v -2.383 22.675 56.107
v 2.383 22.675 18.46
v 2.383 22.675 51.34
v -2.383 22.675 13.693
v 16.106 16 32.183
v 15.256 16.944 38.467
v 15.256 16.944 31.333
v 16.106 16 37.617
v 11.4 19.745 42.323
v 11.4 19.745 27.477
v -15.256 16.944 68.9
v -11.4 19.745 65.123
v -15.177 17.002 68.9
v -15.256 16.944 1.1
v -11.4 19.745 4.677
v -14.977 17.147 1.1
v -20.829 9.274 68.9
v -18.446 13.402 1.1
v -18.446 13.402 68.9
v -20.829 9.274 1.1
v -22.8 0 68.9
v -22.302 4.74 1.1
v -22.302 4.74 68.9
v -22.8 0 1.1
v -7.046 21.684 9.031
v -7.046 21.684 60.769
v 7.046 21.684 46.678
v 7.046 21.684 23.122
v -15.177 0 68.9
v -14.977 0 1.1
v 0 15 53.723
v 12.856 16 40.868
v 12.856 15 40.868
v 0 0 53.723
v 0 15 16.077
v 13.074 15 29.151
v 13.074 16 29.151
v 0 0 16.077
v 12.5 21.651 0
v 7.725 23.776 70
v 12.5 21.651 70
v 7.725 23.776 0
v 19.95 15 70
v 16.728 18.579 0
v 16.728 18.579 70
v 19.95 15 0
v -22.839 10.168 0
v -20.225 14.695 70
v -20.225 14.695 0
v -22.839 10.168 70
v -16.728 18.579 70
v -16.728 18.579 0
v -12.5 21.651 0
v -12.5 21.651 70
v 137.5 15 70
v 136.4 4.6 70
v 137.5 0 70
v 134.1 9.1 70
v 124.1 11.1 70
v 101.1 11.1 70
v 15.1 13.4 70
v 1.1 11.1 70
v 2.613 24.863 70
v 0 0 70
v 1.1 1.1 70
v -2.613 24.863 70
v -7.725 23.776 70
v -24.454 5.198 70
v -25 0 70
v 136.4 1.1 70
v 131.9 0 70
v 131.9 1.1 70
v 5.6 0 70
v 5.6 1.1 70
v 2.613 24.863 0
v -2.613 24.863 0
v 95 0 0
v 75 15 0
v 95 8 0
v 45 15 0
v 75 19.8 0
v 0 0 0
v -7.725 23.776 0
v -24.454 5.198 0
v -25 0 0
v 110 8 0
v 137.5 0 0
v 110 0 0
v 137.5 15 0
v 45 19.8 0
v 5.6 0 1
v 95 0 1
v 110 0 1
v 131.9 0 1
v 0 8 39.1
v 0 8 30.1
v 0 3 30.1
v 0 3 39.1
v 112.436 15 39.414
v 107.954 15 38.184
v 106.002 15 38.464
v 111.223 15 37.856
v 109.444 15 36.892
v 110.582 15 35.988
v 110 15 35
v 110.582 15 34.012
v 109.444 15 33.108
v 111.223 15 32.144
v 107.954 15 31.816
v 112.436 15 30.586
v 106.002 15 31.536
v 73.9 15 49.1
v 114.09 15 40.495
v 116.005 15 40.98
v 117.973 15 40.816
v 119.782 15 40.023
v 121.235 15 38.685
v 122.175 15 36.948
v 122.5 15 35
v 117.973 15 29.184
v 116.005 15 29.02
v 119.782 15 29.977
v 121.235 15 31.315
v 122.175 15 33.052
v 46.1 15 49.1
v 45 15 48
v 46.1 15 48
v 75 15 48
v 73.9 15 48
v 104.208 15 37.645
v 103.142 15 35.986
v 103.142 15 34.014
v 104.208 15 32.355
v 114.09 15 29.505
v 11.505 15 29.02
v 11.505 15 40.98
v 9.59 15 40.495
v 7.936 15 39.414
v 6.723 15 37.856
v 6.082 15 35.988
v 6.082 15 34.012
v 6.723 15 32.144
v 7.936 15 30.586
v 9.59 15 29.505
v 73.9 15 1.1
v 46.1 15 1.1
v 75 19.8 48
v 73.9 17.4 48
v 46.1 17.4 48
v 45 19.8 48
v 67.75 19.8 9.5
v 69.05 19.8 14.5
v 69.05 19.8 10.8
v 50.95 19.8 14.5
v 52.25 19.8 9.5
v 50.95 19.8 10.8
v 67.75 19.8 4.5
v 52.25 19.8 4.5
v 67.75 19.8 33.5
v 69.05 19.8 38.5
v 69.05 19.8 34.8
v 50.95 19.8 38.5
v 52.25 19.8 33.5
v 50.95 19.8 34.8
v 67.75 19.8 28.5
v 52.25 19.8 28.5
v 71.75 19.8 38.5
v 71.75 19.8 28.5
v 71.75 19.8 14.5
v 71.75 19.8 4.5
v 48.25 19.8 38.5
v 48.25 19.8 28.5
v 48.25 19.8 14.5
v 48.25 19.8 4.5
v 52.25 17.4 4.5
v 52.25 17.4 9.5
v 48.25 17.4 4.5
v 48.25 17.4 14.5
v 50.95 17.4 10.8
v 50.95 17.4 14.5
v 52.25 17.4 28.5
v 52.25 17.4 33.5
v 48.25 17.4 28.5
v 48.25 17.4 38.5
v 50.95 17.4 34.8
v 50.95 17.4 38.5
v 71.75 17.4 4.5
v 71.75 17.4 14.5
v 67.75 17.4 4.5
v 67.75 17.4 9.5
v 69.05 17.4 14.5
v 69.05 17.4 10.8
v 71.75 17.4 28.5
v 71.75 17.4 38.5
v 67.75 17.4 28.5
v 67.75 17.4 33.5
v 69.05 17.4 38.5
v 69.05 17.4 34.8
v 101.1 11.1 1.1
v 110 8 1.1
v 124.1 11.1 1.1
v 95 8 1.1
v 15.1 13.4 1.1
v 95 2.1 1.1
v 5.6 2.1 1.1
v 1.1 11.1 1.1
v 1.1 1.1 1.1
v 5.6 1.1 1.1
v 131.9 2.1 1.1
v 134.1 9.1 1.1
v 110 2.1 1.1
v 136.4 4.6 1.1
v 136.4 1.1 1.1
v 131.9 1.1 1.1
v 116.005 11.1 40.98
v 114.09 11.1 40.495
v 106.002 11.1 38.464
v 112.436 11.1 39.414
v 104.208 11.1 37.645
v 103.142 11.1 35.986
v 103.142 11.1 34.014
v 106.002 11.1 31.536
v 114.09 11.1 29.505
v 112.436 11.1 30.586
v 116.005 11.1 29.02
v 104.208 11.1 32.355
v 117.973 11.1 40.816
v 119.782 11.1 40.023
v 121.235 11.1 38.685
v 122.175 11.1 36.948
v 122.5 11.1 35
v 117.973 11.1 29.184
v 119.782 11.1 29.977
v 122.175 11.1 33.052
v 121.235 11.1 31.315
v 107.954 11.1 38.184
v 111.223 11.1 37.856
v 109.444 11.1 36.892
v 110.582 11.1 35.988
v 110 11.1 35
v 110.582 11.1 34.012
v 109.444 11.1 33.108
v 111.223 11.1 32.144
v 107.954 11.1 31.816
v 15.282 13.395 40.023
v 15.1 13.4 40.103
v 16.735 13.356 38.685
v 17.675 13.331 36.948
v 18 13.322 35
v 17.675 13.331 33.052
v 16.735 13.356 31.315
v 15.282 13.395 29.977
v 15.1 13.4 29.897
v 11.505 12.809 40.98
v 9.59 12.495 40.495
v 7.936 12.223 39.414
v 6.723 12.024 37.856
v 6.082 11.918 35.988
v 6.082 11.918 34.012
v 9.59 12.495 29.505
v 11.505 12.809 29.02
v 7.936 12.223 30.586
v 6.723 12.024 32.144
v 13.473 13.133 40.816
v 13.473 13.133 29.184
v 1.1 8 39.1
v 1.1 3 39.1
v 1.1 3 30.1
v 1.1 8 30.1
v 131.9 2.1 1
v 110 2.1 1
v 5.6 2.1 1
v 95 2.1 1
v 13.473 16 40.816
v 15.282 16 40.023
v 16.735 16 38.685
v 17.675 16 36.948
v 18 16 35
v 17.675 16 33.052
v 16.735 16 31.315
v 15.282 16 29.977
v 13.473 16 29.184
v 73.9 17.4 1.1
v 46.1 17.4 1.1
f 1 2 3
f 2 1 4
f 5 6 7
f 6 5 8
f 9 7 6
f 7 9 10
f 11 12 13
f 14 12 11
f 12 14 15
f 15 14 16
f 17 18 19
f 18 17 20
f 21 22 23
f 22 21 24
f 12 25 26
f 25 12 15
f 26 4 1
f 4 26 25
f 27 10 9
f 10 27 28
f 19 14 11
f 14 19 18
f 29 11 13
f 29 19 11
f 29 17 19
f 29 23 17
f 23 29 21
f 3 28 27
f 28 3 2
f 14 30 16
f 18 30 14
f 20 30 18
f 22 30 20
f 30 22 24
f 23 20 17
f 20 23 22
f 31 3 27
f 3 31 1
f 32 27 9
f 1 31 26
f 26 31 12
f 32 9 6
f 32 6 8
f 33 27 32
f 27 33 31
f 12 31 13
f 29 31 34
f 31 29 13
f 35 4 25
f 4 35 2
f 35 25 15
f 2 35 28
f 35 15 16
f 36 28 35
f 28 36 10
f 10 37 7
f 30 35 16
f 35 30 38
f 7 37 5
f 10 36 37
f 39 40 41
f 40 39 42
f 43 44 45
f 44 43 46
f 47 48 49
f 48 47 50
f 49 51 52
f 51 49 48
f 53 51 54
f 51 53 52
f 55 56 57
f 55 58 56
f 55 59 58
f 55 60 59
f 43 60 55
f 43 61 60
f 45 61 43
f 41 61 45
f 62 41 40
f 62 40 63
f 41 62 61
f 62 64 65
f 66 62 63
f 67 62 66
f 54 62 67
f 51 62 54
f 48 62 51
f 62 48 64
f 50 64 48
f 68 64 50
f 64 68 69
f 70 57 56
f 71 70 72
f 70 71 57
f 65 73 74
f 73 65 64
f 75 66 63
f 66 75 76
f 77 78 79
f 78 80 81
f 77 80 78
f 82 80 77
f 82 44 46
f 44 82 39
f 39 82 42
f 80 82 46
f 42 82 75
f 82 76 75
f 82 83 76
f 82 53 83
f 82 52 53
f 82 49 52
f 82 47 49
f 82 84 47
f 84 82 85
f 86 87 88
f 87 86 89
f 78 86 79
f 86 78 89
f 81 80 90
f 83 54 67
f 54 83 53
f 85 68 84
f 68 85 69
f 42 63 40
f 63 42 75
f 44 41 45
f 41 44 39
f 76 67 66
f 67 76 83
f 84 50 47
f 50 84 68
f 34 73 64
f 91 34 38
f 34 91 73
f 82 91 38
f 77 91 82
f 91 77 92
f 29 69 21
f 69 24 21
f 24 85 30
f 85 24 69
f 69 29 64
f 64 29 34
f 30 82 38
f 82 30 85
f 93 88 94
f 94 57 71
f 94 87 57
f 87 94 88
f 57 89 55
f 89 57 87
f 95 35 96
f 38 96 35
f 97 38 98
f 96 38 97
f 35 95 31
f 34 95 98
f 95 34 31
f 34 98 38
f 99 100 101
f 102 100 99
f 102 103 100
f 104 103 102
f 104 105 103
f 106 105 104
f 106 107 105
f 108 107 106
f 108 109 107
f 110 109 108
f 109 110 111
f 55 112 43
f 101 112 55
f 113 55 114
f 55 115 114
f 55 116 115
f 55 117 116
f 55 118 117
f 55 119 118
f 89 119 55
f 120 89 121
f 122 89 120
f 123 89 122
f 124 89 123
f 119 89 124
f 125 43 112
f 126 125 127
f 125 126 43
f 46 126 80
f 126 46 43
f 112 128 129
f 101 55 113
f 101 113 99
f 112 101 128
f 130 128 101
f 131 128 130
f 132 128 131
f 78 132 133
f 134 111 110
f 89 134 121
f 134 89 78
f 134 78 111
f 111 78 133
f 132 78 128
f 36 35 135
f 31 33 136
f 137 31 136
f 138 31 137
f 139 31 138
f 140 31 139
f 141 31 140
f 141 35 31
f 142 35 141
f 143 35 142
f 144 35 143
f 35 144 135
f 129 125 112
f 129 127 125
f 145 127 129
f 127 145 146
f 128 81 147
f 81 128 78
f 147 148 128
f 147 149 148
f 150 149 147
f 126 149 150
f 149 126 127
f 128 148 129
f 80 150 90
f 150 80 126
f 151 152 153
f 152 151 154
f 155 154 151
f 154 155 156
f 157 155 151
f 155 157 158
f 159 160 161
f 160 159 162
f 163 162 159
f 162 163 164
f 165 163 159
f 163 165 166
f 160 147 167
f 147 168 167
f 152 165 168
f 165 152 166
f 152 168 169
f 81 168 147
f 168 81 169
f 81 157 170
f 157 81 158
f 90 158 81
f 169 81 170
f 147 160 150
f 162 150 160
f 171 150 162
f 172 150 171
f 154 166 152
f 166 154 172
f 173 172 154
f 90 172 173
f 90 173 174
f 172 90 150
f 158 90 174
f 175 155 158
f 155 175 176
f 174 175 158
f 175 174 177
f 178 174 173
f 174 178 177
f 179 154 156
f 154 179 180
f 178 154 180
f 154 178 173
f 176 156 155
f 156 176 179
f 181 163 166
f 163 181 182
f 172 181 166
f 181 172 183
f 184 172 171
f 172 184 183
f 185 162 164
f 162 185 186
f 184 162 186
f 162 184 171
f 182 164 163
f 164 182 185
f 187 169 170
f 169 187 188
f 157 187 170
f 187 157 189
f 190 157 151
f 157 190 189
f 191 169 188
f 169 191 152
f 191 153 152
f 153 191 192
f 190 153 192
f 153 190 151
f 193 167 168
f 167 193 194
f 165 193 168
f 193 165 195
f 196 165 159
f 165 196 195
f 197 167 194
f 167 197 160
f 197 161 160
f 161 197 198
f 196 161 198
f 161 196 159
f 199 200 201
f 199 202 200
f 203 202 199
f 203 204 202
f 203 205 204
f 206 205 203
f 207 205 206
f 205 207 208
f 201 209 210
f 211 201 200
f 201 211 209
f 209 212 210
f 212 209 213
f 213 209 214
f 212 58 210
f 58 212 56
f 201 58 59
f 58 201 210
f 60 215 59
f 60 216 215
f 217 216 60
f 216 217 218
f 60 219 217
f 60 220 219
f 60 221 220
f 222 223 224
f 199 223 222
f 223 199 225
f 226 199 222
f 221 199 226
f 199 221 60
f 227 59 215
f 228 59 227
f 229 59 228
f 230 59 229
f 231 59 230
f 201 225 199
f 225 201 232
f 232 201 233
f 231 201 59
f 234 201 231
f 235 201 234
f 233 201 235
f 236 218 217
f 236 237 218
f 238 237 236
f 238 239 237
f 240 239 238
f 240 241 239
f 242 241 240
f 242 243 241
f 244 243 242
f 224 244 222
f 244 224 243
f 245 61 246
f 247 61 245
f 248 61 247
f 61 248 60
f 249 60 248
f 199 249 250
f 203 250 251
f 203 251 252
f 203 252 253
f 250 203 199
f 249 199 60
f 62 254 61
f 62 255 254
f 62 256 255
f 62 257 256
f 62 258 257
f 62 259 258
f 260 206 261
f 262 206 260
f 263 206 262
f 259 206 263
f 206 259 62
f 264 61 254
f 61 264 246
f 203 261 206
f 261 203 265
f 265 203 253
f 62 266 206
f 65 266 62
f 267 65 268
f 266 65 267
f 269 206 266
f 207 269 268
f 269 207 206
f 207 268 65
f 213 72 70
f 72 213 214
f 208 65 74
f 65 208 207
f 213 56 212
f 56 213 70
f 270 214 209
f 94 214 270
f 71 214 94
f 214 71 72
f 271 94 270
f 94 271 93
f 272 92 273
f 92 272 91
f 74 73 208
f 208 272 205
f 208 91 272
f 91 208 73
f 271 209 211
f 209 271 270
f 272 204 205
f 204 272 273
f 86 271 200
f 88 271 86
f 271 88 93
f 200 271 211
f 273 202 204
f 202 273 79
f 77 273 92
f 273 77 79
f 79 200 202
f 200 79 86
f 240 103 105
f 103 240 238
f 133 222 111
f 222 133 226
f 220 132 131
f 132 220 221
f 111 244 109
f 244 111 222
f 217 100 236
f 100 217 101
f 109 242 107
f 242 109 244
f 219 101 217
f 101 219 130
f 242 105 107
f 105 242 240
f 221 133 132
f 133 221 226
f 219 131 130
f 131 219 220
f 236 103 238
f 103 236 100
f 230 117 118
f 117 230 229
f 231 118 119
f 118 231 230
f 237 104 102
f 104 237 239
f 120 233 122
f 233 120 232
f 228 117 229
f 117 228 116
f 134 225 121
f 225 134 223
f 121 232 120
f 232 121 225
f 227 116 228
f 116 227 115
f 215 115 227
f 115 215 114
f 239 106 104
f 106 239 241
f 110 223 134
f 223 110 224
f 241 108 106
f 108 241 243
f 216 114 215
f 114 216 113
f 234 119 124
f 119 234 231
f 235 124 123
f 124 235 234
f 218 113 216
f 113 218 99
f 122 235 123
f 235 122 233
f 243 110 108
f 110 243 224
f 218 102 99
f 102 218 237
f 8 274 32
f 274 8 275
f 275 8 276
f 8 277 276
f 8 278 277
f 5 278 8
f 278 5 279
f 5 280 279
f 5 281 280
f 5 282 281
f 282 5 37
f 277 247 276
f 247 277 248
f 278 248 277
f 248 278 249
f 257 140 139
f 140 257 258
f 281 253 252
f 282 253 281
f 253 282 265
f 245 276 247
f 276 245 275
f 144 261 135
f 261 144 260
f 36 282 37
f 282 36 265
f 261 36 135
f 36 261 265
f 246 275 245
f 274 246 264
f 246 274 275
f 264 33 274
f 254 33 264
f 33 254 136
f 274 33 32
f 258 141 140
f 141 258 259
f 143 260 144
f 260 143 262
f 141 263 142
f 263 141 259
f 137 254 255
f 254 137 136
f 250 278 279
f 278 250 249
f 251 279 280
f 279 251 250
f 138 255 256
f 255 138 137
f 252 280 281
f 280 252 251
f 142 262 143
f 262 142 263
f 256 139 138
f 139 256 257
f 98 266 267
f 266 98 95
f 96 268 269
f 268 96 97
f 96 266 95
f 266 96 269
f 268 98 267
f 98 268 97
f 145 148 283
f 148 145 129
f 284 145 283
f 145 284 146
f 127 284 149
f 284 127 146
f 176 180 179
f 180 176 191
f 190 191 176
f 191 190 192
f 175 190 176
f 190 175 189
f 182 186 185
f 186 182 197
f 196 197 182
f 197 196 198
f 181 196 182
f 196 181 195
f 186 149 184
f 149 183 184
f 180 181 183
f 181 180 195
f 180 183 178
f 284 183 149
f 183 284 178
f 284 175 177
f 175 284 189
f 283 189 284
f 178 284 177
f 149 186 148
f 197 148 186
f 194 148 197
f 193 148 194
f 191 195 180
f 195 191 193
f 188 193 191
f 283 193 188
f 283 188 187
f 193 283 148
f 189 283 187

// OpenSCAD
/*
 * Galaxy Nexus Mount
 *
 * Copyright 2012 <b@Zi.iS>
 * License CC BY 3.0.
 *
 */

thickness = 1.1;
depth = 15;

mount_width=30;
mount_height=43;
mount_offset=45;
mount_lip = 2.4;
mount_depth = 2.4;
mount_thickness=2.7;
mount_overhang = 4;
mount_size = 5;
mount_pitch_x = 19.5;
mount_pitch_y = 24;
mount_print = sqrt(pow((mount_overhang-mount_thickness),2)*2);

horn=25;

difference() {

	union() {

		//Case
		cube([
			135.3+2*thickness,
			depth,
			70
		]);
		translate([
			mount_offset,
			depth,
			0
		]) {
			cube([
				mount_width,
				mount_lip+mount_depth,
				mount_height+mount_size
			]);
		}

		//Horn
		difference() {
			cylinder(
				r=horn,
				h=70
			);
			translate([
				-horn,
				-horn,
				-1
			]) {
				cube([
					horn*2,
					horn,
					72
				]);
			}
			intersection(){
				translate([
					0,
					0,
					thickness
				]) {
					cylinder(
						r=horn-thickness*2,
						h=70-thickness*2
					);
				}
				translate([
					-83,
					-30,
					72/2-thickness
				]) {
					rotate([
						0,
						45,
						0
					]) {
						cube([
							72,
							72,
							72
						]);
					}
				}
			}
		}
	}




	//Phone
	translate([
		thickness,
		thickness,
		thickness
	]) {
		linear_extrude(100) {
			polygon([
				[0,0],
				[0,10],
				[14,12.3],
				[100,10],
				[123,10],
				[133,8],
				[135.3,3.5],
				[135.3,0],
			]);
		}
	}

	//Screen
	translate([
		thickness+4.5,
		-1,
		1
	]) {
		cube([
			135.3-4.5*2,
			thickness+2,
			70
		]);
	}

	// Power button
	translate([
		95,
		-1,
		-1
	]) {
		cube([
			15,
			8+1,
			thickness+2
		]);
	}

	//Flash
	translate([
		106.5,
		50,
		35
	]) {
		rotate([
			90,
			0,
			0
		]) {
			cylinder(
				r=7/2,
				h=100
			);
		}
	}

	//Camera
	translate([
		116.5,
		50,
		35
	]) {
		rotate([
			90,
			0,
			0
		]) {
			cylinder(
				r=12/2,
				h=100
			);
		}
	}

	//Speeker
	translate([
		12,
		16,
		35
	]) {
		rotate([
			90,
			0,
			0
		]) {
			cylinder(
				r=12/2,
				h=12
			);
		}
	}

	//USB
	translate([
		-thickness,
		3,
		thickness+29
	]) {
		cube([
			2+thickness,
			5,			
			9,
		]);
	}

	//Hollow
	translate([
		mount_offset+thickness,
		depth,
		thickness
	]) {
		cube([
			mount_width-thickness*2,
			mount_depth,
			mount_height+mount_size
		]);
	}

	//Fixings
	for(x=[0:1]) {
		for(y=[0:1]) {
			translate([
				mount_offset+(mount_width-mount_pitch_x-mount_overhang)/2 + mount_pitch_x*x,
				depth+mount_depth-1,
				(mount_height-mount_pitch_y-mount_size*2)/2+mount_pitch_y*y
			]) {
				cube([
					mount_overhang,
,					mount_lip+2,
					mount_size,
				]);
			}
			translate([
				mount_offset+(mount_width-mount_pitch_x-mount_overhang)/2 + mount_pitch_x*x+(mount_overhang-mount_thickness)*x,
				depth+mount_depth-1,
				(mount_height-mount_pitch_y-mount_size*2)/2+mount_pitch_y*y+mount_size
			]) {
				cube([
					mount_thickness,
					mount_lip+2,
					mount_size,
					
				]);
			}
			
			translate([
				mount_offset+(mount_width-mount_pitch_x-mount_overhang)/2+mount_overhang-sqrt(pow(mount_print,2)*2)+ (mount_pitch_x-mount_thickness+sqrt(pow(mount_print,2)*2)/2)*x,
				depth+mount_depth-1,
				(mount_height-mount_pitch_y-mount_size*2)/2+mount_pitch_y*y+mount_size
			]) {
				rotate([
					0,
					45,
					0
				]) {
					cube([
						mount_print,
						mount_lip+2,
						mount_print,
					]);
				}
			}
		}
	}
}
